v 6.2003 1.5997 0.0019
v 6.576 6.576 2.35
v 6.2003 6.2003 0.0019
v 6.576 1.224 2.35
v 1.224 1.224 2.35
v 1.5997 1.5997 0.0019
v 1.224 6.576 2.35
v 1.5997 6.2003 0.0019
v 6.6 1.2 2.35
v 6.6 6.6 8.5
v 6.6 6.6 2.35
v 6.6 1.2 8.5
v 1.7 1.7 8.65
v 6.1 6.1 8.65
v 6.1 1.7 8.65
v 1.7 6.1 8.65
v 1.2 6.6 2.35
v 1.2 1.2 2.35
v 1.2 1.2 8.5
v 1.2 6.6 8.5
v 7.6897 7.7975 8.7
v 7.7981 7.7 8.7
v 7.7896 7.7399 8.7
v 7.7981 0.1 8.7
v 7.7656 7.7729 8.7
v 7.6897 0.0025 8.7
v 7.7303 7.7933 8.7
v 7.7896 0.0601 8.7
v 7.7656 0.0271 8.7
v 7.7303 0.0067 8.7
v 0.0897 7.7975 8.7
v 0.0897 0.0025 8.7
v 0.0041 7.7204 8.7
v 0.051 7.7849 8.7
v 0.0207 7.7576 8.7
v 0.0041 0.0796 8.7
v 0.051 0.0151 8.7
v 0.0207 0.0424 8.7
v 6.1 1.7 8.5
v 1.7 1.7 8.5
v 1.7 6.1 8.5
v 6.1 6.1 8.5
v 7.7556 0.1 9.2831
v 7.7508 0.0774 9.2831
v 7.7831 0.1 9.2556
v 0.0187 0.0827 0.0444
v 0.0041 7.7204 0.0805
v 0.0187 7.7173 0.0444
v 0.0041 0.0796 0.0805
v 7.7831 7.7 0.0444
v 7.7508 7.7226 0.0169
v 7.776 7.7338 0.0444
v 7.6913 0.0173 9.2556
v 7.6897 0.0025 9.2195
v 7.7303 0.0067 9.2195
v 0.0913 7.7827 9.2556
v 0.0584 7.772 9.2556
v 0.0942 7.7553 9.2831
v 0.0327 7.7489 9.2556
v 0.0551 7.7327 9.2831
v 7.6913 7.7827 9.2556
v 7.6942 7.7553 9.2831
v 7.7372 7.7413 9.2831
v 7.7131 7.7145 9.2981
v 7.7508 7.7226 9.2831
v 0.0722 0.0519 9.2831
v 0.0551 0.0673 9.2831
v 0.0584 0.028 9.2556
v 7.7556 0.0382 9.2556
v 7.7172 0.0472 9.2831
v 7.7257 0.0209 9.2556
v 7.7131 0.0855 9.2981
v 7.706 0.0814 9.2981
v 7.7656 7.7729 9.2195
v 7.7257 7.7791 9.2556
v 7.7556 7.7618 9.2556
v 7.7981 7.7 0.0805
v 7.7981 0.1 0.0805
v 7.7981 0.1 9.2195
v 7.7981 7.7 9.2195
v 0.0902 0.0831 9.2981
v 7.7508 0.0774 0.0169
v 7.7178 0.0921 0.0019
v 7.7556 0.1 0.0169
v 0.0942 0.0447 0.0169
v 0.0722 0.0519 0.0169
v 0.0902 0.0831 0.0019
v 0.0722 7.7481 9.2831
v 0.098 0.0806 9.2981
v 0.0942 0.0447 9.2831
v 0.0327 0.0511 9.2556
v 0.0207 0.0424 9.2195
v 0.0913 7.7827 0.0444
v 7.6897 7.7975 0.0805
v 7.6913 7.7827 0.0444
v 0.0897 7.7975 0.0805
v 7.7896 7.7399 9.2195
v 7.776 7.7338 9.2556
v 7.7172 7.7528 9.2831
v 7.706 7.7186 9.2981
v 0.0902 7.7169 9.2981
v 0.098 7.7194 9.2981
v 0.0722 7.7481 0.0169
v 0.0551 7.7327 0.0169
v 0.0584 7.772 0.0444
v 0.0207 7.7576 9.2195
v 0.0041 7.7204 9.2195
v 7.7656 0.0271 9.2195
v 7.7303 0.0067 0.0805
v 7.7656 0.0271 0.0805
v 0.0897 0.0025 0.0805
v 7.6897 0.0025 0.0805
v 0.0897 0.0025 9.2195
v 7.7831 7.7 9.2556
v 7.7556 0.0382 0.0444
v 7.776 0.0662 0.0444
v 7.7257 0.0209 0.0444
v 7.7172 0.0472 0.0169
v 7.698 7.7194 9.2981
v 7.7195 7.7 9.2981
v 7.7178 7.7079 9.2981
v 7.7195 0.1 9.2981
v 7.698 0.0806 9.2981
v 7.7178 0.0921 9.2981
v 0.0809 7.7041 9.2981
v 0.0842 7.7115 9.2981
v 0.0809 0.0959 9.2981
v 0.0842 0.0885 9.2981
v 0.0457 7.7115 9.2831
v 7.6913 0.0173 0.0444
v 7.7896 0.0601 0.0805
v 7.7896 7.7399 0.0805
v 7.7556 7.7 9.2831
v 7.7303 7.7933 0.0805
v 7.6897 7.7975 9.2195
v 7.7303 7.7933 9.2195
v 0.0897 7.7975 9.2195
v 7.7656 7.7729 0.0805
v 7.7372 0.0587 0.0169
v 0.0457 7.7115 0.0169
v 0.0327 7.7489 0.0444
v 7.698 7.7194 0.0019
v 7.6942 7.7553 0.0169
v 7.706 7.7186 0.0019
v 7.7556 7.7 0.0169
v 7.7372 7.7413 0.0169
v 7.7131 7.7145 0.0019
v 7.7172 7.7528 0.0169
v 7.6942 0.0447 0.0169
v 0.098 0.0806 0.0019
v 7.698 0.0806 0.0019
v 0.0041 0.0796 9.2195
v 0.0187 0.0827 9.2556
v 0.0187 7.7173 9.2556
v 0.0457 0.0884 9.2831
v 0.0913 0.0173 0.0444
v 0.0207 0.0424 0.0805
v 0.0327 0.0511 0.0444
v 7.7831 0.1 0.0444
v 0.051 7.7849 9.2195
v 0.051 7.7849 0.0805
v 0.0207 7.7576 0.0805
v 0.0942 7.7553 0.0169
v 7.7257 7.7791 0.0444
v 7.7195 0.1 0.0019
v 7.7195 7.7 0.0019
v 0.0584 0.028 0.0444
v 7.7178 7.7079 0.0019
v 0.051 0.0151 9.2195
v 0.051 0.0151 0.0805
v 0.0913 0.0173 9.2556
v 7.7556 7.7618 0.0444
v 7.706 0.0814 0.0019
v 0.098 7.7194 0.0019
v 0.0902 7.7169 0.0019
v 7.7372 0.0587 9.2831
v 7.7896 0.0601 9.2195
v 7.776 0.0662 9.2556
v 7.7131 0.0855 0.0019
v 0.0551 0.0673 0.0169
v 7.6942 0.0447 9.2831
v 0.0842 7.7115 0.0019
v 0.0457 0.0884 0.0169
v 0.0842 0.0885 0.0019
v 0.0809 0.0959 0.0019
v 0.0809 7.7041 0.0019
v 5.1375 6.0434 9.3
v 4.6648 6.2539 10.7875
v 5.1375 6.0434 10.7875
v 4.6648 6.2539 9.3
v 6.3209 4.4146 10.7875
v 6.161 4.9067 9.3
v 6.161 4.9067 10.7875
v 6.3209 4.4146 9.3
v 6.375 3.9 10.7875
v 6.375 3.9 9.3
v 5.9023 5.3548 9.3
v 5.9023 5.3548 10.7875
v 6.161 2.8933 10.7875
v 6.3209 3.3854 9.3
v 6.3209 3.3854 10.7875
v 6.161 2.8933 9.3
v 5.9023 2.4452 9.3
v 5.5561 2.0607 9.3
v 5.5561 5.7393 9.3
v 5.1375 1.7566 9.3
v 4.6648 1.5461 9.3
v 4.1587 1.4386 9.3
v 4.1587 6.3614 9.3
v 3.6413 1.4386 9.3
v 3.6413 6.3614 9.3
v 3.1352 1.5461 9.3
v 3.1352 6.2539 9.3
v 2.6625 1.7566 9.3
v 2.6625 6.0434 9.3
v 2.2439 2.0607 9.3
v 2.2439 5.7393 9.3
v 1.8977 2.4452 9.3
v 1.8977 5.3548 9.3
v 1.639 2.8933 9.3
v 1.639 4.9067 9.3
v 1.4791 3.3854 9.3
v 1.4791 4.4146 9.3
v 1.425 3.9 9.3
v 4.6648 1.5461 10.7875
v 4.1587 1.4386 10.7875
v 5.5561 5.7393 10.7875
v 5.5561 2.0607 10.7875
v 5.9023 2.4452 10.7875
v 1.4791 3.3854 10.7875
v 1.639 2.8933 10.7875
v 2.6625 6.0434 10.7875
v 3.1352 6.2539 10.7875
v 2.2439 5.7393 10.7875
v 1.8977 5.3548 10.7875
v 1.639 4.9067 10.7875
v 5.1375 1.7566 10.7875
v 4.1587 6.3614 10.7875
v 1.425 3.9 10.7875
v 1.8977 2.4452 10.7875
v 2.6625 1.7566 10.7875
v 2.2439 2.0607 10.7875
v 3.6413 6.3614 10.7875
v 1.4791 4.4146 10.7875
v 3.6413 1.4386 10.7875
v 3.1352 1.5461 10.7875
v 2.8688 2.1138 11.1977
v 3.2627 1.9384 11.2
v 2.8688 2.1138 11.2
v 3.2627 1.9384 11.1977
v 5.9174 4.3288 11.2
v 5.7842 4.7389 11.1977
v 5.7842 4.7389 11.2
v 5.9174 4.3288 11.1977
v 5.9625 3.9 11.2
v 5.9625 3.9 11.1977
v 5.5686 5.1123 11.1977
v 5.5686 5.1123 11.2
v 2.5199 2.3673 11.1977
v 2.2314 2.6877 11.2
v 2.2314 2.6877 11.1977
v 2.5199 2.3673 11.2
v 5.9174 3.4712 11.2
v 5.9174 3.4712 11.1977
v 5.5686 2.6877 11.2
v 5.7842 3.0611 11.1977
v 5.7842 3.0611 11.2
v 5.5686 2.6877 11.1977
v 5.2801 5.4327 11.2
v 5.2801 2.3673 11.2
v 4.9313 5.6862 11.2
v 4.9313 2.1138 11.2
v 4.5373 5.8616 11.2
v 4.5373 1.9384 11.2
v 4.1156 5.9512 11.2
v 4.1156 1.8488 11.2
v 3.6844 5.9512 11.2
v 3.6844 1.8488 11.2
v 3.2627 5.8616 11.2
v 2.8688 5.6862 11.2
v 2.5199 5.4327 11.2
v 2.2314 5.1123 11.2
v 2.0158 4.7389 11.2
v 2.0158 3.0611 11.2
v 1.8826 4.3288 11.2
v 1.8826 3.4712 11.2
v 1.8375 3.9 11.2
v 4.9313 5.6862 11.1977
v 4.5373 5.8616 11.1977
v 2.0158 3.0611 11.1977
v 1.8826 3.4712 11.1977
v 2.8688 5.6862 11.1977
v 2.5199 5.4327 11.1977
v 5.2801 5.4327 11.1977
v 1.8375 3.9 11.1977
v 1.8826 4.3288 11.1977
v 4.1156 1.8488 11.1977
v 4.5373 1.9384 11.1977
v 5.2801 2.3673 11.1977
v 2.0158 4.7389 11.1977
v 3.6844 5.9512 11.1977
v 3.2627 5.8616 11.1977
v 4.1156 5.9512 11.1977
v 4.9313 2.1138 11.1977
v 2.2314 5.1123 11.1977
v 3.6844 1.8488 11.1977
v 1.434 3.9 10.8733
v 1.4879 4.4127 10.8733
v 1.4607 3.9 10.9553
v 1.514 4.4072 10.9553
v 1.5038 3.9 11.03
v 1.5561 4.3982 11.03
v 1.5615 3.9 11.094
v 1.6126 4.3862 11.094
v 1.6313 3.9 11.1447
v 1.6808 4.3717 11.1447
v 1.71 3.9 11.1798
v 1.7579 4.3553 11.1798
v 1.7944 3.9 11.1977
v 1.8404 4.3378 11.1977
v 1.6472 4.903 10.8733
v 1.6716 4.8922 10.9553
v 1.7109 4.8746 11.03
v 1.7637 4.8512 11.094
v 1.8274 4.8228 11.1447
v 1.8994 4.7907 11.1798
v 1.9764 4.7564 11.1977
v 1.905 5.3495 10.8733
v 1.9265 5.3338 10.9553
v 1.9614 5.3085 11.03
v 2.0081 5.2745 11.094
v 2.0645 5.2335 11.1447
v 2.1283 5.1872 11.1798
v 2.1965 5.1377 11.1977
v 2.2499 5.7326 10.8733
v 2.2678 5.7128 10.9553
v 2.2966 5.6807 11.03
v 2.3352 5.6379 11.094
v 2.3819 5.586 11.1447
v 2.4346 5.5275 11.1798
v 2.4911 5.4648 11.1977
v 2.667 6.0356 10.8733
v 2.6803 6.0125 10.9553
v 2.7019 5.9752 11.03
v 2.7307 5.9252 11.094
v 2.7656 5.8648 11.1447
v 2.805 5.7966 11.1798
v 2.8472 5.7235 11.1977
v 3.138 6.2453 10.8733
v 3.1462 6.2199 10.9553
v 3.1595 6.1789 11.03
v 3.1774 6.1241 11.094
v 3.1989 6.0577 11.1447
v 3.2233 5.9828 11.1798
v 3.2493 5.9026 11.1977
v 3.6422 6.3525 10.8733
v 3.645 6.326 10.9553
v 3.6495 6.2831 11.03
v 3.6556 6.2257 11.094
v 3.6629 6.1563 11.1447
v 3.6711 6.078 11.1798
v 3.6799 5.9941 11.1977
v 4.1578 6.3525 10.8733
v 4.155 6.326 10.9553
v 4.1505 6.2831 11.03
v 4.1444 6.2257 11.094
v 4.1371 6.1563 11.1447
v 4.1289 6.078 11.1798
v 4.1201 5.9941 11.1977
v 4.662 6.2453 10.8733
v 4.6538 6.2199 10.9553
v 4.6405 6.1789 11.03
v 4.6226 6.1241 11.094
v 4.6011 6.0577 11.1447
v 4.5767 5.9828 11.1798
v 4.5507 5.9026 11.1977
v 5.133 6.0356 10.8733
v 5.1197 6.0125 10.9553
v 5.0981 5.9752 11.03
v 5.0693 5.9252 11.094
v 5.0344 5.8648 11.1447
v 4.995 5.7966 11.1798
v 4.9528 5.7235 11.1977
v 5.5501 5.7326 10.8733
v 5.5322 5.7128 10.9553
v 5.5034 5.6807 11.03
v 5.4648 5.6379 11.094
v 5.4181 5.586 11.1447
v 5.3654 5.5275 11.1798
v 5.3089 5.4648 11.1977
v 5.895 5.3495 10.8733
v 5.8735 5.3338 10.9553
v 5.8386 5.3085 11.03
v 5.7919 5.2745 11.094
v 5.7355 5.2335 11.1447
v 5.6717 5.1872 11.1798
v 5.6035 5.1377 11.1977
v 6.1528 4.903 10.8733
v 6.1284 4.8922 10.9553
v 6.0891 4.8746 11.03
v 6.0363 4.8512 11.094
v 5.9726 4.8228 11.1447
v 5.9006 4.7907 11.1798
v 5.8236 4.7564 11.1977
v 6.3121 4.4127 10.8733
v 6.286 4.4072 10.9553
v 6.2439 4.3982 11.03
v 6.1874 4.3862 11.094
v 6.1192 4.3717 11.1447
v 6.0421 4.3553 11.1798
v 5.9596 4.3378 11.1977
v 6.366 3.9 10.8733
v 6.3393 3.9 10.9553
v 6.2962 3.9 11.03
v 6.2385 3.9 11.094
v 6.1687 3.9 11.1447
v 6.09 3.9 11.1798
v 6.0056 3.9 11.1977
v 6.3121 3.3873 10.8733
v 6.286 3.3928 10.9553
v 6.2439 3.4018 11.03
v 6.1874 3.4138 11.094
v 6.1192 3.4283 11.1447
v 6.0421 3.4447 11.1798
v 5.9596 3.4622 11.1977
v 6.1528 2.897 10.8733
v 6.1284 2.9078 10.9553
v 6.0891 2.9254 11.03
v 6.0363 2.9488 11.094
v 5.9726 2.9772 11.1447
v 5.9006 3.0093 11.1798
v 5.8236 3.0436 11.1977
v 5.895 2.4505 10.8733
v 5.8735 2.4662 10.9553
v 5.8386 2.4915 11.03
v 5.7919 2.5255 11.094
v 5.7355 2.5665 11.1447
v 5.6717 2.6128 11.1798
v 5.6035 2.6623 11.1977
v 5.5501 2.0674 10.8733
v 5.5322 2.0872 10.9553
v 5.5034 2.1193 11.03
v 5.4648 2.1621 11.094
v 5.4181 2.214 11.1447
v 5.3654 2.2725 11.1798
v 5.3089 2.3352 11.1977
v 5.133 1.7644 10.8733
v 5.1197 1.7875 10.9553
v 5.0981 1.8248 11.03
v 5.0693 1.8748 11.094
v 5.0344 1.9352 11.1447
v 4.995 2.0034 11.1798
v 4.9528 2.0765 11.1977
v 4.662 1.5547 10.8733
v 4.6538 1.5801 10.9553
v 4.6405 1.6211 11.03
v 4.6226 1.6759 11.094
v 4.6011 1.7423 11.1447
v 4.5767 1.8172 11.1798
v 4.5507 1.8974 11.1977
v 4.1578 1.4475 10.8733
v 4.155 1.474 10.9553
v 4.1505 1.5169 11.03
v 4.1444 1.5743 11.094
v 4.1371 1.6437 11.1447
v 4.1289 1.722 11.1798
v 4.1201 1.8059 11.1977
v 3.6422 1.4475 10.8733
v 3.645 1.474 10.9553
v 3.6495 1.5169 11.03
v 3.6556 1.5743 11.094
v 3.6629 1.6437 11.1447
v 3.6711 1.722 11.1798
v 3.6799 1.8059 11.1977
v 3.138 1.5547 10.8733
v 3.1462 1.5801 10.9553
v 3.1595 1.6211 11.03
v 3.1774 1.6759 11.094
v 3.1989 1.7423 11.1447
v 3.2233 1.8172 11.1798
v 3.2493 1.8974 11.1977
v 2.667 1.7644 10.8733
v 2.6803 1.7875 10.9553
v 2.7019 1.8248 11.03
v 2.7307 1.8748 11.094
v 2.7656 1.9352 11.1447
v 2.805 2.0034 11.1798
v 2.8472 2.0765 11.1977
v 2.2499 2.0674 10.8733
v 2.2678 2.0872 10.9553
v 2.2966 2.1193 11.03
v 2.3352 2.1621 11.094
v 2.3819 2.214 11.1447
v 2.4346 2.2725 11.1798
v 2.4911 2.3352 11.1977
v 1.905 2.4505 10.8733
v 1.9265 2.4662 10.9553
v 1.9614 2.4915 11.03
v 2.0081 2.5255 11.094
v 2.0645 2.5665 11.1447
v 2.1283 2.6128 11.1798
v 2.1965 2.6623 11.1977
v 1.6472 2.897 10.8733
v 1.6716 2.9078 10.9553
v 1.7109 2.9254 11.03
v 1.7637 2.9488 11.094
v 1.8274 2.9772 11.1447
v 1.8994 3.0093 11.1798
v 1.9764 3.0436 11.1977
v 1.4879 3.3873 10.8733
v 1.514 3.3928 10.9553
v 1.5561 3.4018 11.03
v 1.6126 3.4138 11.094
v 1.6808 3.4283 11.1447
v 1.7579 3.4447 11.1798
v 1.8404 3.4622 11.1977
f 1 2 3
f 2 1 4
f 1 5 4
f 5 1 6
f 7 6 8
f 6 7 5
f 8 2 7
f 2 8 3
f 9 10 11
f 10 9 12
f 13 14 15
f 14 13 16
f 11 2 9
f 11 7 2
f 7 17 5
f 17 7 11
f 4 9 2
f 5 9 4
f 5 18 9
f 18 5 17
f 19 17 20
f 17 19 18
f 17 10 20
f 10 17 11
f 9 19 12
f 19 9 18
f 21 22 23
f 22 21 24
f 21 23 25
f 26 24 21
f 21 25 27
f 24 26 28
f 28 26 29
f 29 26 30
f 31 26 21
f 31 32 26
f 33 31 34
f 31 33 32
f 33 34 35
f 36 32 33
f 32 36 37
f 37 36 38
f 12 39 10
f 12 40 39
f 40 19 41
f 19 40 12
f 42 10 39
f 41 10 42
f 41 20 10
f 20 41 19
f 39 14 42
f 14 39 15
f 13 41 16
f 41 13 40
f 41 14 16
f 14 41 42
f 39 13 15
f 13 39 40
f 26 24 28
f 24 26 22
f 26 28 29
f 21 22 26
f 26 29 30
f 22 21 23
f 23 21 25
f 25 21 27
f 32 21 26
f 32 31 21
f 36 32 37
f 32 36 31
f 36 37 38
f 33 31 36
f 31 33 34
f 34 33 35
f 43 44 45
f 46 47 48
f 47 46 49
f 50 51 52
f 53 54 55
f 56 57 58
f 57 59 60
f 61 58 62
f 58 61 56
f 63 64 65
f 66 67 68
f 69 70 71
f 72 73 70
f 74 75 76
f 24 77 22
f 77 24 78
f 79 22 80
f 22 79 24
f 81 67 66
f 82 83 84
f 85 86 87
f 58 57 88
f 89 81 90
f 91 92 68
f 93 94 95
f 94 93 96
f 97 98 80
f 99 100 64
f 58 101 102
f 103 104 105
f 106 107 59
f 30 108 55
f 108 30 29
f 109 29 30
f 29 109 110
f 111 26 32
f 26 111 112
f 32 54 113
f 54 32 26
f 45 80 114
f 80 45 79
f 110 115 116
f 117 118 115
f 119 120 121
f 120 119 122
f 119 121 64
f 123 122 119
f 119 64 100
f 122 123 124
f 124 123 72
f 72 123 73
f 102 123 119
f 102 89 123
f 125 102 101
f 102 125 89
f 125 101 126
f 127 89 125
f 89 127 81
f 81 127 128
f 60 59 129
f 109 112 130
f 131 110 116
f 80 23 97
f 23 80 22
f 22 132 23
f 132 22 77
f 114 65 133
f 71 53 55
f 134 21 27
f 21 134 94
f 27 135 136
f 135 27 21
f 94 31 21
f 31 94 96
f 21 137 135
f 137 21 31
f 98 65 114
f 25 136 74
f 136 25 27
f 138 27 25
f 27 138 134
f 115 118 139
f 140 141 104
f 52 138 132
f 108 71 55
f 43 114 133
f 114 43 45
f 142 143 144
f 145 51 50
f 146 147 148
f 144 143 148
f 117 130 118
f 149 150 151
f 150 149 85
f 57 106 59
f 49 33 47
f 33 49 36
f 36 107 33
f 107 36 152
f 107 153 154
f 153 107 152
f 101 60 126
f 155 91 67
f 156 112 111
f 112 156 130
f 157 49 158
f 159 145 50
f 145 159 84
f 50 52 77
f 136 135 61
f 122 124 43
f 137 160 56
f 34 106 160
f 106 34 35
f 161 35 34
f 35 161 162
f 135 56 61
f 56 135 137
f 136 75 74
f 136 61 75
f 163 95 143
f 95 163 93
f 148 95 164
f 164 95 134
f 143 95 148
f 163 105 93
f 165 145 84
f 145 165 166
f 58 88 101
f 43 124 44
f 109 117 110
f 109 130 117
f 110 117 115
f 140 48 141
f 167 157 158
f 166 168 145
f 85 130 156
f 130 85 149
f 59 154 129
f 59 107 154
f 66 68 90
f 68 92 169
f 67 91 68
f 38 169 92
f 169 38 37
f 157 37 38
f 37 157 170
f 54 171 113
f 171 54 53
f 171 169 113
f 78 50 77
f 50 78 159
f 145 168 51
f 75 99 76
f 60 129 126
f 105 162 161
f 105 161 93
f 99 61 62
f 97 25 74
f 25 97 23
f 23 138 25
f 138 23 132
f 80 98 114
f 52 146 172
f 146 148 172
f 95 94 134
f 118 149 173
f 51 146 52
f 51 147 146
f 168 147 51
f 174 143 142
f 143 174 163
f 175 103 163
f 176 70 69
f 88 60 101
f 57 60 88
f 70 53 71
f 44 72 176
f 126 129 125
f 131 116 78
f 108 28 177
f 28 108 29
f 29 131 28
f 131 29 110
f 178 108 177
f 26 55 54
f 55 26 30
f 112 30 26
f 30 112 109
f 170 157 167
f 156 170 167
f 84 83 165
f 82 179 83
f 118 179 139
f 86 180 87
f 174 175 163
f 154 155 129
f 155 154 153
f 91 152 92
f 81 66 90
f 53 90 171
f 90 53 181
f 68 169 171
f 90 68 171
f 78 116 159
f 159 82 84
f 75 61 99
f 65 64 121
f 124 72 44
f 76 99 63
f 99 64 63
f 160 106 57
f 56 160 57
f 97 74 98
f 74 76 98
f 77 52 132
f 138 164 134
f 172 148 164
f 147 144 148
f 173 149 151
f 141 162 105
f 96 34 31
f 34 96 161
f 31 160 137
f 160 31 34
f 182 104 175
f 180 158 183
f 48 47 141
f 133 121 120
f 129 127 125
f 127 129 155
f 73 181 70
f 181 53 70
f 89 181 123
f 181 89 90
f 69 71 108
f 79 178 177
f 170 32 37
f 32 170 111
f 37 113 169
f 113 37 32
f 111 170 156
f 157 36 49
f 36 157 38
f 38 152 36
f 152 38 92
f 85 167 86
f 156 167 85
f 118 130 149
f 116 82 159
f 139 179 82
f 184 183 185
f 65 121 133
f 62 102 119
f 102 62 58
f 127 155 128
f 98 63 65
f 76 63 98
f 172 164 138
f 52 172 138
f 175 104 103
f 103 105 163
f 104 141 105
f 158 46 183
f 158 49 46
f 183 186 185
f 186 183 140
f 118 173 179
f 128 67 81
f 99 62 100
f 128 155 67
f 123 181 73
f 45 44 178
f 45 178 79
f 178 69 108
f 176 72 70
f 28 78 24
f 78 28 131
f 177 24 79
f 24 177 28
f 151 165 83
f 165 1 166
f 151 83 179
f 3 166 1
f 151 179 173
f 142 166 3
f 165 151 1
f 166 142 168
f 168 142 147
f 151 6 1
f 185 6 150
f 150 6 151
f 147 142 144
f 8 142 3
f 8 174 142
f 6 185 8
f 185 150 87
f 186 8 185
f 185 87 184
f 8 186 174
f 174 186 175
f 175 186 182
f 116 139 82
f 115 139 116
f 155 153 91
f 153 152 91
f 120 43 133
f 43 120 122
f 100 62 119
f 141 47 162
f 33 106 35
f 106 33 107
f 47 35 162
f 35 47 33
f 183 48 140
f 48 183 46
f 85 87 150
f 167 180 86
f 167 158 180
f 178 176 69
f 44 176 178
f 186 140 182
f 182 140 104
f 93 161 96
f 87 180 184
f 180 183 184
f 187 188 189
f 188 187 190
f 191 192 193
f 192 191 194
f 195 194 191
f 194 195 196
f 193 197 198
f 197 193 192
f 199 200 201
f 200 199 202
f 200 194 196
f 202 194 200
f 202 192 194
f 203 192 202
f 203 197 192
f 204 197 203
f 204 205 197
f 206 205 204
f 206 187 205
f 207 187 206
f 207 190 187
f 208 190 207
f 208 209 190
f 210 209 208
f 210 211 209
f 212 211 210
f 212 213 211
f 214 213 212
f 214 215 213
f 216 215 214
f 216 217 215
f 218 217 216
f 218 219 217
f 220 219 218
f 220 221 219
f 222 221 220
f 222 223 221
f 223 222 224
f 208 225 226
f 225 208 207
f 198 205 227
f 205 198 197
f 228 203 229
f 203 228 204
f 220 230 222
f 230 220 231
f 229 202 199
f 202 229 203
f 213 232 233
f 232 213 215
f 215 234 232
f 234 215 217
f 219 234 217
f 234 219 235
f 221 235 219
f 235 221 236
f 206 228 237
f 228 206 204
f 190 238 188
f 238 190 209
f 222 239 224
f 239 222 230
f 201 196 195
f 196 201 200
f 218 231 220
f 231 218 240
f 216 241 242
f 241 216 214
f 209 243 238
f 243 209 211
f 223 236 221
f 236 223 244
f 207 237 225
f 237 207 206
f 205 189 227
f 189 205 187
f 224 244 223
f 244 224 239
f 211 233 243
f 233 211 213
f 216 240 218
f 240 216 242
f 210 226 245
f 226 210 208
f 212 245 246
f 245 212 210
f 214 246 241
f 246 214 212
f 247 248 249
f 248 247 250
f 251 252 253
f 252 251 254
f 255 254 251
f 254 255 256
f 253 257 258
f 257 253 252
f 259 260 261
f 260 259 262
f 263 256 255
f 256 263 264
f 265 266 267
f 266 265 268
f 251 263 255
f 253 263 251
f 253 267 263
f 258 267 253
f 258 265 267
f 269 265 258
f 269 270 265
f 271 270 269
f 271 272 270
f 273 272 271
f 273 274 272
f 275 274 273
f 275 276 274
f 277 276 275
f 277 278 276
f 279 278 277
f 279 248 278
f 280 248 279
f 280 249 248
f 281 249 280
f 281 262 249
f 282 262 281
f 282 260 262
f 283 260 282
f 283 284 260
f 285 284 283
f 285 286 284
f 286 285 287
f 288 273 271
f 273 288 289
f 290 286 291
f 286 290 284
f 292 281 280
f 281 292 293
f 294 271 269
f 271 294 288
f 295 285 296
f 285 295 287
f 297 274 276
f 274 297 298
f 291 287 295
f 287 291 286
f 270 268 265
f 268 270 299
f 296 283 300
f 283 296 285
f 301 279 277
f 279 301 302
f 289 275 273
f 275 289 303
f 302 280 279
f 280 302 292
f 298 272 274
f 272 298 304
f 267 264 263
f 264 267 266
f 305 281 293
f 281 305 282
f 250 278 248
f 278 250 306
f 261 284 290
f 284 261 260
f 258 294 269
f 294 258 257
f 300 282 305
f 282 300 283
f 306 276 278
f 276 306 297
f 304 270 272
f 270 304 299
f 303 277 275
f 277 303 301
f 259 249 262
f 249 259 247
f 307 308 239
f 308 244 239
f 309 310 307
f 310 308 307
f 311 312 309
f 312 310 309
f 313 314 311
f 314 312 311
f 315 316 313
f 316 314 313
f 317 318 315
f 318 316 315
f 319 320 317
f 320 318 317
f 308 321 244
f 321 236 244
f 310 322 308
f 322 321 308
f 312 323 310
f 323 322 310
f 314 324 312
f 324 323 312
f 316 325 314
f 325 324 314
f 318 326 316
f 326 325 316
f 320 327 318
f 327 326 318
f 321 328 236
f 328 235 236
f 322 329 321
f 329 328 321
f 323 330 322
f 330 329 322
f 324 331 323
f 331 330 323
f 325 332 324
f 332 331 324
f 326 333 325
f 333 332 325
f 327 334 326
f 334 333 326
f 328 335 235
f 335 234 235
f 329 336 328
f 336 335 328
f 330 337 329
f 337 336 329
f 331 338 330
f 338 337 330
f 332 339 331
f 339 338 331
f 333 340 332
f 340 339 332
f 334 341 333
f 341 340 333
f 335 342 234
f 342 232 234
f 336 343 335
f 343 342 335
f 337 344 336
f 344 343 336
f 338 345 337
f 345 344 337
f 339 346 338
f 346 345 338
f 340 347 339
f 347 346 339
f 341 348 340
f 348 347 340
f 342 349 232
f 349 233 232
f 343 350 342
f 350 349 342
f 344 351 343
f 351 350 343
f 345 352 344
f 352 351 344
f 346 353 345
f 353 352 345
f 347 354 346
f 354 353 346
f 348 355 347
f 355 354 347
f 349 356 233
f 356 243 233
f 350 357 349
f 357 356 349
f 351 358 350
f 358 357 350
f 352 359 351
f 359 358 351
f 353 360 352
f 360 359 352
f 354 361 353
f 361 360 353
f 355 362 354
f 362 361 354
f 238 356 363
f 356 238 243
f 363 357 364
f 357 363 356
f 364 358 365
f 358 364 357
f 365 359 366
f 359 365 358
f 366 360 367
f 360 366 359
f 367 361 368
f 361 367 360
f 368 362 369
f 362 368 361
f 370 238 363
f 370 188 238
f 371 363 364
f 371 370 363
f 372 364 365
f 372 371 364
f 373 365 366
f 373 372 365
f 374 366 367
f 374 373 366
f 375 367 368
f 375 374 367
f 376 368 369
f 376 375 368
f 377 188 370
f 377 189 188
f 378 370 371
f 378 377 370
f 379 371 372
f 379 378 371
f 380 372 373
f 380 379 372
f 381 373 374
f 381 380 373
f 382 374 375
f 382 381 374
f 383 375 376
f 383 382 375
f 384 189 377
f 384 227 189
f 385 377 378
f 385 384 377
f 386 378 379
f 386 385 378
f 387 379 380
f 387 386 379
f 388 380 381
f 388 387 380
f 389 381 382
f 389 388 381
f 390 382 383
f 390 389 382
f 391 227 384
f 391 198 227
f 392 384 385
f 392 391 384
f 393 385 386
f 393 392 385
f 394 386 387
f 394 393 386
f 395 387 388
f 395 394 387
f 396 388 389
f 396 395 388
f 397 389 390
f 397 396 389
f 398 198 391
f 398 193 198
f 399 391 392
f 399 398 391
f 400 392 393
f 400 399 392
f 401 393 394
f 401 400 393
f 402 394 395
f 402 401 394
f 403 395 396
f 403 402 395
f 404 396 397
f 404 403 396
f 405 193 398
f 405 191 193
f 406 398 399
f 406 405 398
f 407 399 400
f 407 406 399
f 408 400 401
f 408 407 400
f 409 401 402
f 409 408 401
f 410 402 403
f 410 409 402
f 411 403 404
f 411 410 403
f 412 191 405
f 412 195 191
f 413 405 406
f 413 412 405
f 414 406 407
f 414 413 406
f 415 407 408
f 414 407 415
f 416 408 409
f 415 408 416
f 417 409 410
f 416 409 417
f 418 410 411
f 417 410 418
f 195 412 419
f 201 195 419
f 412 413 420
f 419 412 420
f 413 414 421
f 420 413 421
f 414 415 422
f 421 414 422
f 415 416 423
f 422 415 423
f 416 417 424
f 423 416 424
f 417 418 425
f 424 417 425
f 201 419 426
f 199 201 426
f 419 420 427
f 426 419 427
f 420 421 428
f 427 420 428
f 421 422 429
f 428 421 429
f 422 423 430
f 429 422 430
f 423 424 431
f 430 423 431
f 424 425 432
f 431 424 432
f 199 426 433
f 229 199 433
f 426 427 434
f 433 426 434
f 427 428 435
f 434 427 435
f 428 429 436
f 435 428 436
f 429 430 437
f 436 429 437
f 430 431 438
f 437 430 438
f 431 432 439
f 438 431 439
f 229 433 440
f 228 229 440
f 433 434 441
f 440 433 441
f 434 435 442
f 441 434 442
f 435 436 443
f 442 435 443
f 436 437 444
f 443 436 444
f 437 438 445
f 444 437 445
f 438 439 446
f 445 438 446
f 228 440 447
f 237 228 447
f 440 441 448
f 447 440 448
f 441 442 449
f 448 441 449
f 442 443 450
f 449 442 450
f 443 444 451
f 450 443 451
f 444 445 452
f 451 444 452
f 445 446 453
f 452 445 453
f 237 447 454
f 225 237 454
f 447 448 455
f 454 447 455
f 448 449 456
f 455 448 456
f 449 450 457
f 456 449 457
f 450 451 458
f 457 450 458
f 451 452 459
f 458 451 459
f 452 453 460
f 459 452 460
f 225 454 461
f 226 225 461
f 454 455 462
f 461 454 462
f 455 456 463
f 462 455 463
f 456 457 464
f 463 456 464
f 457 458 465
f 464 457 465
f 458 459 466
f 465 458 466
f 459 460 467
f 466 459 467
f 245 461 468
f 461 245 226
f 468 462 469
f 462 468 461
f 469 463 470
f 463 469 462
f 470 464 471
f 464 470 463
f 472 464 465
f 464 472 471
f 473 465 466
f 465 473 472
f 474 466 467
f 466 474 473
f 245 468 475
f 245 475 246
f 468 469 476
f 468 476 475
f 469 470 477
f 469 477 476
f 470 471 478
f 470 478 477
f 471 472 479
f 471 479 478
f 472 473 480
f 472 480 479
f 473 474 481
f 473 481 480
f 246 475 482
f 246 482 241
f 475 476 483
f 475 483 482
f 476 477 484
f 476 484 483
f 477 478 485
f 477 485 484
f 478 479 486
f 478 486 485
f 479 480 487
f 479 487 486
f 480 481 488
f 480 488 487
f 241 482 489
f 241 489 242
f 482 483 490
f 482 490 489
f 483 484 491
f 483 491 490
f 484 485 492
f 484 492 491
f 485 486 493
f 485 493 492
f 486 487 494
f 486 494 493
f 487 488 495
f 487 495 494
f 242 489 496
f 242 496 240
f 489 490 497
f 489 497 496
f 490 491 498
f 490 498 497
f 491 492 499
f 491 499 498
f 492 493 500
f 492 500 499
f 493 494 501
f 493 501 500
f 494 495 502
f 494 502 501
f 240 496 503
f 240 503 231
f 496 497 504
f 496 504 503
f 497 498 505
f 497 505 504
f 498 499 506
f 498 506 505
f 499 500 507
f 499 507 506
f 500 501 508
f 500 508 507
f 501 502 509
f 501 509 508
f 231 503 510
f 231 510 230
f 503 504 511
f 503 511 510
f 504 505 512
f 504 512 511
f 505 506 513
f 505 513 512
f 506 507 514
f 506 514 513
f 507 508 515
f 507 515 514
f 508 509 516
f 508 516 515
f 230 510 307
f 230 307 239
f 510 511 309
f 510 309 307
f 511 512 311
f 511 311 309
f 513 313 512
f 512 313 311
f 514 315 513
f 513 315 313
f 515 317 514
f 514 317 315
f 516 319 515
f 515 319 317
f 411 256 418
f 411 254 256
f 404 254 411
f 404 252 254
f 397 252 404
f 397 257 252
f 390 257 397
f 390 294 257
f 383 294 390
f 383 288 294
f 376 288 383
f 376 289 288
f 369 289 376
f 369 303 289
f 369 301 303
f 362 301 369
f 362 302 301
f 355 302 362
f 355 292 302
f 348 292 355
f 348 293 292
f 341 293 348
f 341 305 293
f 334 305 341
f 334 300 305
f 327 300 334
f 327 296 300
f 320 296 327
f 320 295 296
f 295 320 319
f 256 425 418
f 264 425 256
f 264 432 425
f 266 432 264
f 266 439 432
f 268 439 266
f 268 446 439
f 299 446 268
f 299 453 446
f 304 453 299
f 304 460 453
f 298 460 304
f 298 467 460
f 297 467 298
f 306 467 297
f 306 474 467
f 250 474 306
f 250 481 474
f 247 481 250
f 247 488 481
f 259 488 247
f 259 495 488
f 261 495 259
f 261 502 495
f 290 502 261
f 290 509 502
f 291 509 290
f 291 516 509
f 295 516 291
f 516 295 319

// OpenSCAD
// file: ../../lib/brick-hollow.scad
/**
* Machine Blocks
* https://machinemania.net/blocks 
*
* Brick Hollow
* Copyright (c) 2022 Jan Philipp Knoeller <pk@pksoftware.de>
*
* Published under license:
* Creative Commons Attribution-NonCommercial-ShareAlike 4.0 International 
* https://creativecommons.org/licenses/by-nc-sa/4.0/
*
*/
echo(version=version());

module brickHollow(height=9.3, fade=2.5, minSize=[4.6,4.6], maxSize=[5.2, 5.2], center = false){
    echo(height, minSize, maxSize, fade);
    sizeX = max(minSize[0],maxSize[0]); 
   sizeY = max(minSize[1],maxSize[1]); 
    
    posX = center ? 0 : 0.5*sizeX; 
   posY = center ? 0 : 0.5*sizeY;   
   posZ = center ? -0.5 * (height-fade) : 0.5*fade;
    
    cutHelper = 0.2;
    overlapSpace=0.1;
    
    translate([posX, posY, posZ]){
        union(){
            polyhedron(points=[
                [-0.5*minSize[0],-0.5*minSize[1],-0.5*fade],
                [0.5*minSize[0],-0.5*minSize[1],-0.5*fade],
                [0.5*minSize[0],0.5*minSize[1],-0.5*fade],
                [-0.5*minSize[0],0.5*minSize[1],-0.5*fade],
                [-0.5*maxSize[0],-0.5*maxSize[1],0.5*fade],
                [0.5*maxSize[0],-0.5*maxSize[1],0.5*fade],
                [0.5*maxSize[0],0.5*maxSize[1],0.5*fade],
                [-0.5*maxSize[0],0.5*maxSize[1],0.5*fade]
            ], faces=[[0,1,2,3],[1,0,4,5],[2,1,5,6],[3,2,6,7],[0,3,7,4],[7,6,5,4]]);
            
            if(height > fade){
                translate([0,0,0.5*height - overlapSpace]){
                    cube([maxSize[0], maxSize[1], height - fade + overlapSpace], center=true);
                }
            }
            
            translate([0,0,-0.5*(fade + cutHelper) + overlapSpace]){
                cube([minSize[0], minSize[1], cutHelper + overlapSpace], center=true);
            }
        }
    }
}

//brickHollow(height=9.3, maxSize=[5.2,5.2], minSize=[4.6,4.6], center=true);
// file: ../../lib/roundedcube_simple.scad
/**
* Machine Blocks
* https://machinemania.net/blocks 
*
* Module for simple rounded cubes
* Copyright (c) 2022 Jan Philipp Knoeller <pk@pksoftware.de>
*
* Published under license:
* Creative Commons Attribution-NonCommercial-ShareAlike 4.0 International 
* https://creativecommons.org/licenses/by-nc-sa/4.0/
*
*/
module roundedcube_simple(size = [1, 1, 1], center = false, radius = 0.5, resolution = 20) {
	// If single value, convert to [x, y, z] vector
	size = (size[0] == undef) ? [size, size, size] : size;

	translate = (center == false) ?
		[radius, radius, radius] :
		[
			radius - (size[0] / 2),
			radius - (size[1] / 2),
			radius - (size[2] / 2)
	];

	translate(v = translate)
	minkowski() {
		cube(size = [
			size[0] - (radius * 2),
			size[1] - (radius * 2),
			size[2] - (radius * 2)
		]);
		sphere(r = radius, $fn = resolution);
	}
}
// file: ../../lib/roundedcube.scad
// More information: https://danielupshaw.com/openscad-rounded-corners/

// Set to 0.01 for higher definition curves (renders slower)
$fs = 0.15;

module roundedcube(size = [1, 1, 1], center = false, radius = 0.5, apply_to = "all", resolution = 20) {
	// If single value, convert to [x, y, z] vector
	size = (size[0] == undef) ? [size, size, size] : size;

	translate_min = radius;
	translate_xmax = size[0] - radius;
	translate_ymax = size[1] - radius;
	translate_zmax = size[2] - radius;

	diameter = radius * 2;

	obj_translate = (center == false) ?
		[0, 0, 0] : [
			-(size[0] / 2),
			-(size[1] / 2),
			-(size[2] / 2)
		];

	translate(v = obj_translate) {
		hull() {
			for (translate_x = [translate_min, translate_xmax]) {
				x_at = (translate_x == translate_min) ? "min" : "max";
				for (translate_y = [translate_min, translate_ymax]) {
					y_at = (translate_y == translate_min) ? "min" : "max";
					for (translate_z = [translate_min, translate_zmax]) {
						z_at = (translate_z == translate_min) ? "min" : "max";

						translate(v = [translate_x, translate_y, translate_z])
						if (
							(apply_to == "all") ||
							(apply_to == "xmin" && x_at == "min") || (apply_to == "xmax" && x_at == "max") ||
							(apply_to == "ymin" && y_at == "min") || (apply_to == "ymax" && y_at == "max") ||
							(apply_to == "zmin" && z_at == "min") || (apply_to == "zmax" && z_at == "max")
						) {
							sphere(r = radius, $fn = resolution);
						} else {
							rotate = 
								(apply_to == "xmin" || apply_to == "xmax" || apply_to == "x") ? [0, 90, 0] : (
								(apply_to == "ymin" || apply_to == "ymax" || apply_to == "y") ? [90, 90, 0] :
								[0, 0, 0]
							);
							rotate(a = rotate)
							cylinder(h = diameter, r = radius, center = true, $fn = resolution);
						}
					}
				}
			}
		}
	}
}
// main file
/**
* Machine Blocks
* https://machinemania.net/blocks 
*
* Brick 1x1
* Copyright (c) 2022 Jan Philipp Knoeller <pk@pksoftware.de>
*
* Published under license:
* Creative Commons Attribution-NonCommercial-ShareAlike 4.0 International 
* https://creativecommons.org/licenses/by-nc-sa/4.0/
*
*/
echo(version=version());

include <../../lib/block-v2.scad>;

block(baseLayers=3, grid=[1,1]);
